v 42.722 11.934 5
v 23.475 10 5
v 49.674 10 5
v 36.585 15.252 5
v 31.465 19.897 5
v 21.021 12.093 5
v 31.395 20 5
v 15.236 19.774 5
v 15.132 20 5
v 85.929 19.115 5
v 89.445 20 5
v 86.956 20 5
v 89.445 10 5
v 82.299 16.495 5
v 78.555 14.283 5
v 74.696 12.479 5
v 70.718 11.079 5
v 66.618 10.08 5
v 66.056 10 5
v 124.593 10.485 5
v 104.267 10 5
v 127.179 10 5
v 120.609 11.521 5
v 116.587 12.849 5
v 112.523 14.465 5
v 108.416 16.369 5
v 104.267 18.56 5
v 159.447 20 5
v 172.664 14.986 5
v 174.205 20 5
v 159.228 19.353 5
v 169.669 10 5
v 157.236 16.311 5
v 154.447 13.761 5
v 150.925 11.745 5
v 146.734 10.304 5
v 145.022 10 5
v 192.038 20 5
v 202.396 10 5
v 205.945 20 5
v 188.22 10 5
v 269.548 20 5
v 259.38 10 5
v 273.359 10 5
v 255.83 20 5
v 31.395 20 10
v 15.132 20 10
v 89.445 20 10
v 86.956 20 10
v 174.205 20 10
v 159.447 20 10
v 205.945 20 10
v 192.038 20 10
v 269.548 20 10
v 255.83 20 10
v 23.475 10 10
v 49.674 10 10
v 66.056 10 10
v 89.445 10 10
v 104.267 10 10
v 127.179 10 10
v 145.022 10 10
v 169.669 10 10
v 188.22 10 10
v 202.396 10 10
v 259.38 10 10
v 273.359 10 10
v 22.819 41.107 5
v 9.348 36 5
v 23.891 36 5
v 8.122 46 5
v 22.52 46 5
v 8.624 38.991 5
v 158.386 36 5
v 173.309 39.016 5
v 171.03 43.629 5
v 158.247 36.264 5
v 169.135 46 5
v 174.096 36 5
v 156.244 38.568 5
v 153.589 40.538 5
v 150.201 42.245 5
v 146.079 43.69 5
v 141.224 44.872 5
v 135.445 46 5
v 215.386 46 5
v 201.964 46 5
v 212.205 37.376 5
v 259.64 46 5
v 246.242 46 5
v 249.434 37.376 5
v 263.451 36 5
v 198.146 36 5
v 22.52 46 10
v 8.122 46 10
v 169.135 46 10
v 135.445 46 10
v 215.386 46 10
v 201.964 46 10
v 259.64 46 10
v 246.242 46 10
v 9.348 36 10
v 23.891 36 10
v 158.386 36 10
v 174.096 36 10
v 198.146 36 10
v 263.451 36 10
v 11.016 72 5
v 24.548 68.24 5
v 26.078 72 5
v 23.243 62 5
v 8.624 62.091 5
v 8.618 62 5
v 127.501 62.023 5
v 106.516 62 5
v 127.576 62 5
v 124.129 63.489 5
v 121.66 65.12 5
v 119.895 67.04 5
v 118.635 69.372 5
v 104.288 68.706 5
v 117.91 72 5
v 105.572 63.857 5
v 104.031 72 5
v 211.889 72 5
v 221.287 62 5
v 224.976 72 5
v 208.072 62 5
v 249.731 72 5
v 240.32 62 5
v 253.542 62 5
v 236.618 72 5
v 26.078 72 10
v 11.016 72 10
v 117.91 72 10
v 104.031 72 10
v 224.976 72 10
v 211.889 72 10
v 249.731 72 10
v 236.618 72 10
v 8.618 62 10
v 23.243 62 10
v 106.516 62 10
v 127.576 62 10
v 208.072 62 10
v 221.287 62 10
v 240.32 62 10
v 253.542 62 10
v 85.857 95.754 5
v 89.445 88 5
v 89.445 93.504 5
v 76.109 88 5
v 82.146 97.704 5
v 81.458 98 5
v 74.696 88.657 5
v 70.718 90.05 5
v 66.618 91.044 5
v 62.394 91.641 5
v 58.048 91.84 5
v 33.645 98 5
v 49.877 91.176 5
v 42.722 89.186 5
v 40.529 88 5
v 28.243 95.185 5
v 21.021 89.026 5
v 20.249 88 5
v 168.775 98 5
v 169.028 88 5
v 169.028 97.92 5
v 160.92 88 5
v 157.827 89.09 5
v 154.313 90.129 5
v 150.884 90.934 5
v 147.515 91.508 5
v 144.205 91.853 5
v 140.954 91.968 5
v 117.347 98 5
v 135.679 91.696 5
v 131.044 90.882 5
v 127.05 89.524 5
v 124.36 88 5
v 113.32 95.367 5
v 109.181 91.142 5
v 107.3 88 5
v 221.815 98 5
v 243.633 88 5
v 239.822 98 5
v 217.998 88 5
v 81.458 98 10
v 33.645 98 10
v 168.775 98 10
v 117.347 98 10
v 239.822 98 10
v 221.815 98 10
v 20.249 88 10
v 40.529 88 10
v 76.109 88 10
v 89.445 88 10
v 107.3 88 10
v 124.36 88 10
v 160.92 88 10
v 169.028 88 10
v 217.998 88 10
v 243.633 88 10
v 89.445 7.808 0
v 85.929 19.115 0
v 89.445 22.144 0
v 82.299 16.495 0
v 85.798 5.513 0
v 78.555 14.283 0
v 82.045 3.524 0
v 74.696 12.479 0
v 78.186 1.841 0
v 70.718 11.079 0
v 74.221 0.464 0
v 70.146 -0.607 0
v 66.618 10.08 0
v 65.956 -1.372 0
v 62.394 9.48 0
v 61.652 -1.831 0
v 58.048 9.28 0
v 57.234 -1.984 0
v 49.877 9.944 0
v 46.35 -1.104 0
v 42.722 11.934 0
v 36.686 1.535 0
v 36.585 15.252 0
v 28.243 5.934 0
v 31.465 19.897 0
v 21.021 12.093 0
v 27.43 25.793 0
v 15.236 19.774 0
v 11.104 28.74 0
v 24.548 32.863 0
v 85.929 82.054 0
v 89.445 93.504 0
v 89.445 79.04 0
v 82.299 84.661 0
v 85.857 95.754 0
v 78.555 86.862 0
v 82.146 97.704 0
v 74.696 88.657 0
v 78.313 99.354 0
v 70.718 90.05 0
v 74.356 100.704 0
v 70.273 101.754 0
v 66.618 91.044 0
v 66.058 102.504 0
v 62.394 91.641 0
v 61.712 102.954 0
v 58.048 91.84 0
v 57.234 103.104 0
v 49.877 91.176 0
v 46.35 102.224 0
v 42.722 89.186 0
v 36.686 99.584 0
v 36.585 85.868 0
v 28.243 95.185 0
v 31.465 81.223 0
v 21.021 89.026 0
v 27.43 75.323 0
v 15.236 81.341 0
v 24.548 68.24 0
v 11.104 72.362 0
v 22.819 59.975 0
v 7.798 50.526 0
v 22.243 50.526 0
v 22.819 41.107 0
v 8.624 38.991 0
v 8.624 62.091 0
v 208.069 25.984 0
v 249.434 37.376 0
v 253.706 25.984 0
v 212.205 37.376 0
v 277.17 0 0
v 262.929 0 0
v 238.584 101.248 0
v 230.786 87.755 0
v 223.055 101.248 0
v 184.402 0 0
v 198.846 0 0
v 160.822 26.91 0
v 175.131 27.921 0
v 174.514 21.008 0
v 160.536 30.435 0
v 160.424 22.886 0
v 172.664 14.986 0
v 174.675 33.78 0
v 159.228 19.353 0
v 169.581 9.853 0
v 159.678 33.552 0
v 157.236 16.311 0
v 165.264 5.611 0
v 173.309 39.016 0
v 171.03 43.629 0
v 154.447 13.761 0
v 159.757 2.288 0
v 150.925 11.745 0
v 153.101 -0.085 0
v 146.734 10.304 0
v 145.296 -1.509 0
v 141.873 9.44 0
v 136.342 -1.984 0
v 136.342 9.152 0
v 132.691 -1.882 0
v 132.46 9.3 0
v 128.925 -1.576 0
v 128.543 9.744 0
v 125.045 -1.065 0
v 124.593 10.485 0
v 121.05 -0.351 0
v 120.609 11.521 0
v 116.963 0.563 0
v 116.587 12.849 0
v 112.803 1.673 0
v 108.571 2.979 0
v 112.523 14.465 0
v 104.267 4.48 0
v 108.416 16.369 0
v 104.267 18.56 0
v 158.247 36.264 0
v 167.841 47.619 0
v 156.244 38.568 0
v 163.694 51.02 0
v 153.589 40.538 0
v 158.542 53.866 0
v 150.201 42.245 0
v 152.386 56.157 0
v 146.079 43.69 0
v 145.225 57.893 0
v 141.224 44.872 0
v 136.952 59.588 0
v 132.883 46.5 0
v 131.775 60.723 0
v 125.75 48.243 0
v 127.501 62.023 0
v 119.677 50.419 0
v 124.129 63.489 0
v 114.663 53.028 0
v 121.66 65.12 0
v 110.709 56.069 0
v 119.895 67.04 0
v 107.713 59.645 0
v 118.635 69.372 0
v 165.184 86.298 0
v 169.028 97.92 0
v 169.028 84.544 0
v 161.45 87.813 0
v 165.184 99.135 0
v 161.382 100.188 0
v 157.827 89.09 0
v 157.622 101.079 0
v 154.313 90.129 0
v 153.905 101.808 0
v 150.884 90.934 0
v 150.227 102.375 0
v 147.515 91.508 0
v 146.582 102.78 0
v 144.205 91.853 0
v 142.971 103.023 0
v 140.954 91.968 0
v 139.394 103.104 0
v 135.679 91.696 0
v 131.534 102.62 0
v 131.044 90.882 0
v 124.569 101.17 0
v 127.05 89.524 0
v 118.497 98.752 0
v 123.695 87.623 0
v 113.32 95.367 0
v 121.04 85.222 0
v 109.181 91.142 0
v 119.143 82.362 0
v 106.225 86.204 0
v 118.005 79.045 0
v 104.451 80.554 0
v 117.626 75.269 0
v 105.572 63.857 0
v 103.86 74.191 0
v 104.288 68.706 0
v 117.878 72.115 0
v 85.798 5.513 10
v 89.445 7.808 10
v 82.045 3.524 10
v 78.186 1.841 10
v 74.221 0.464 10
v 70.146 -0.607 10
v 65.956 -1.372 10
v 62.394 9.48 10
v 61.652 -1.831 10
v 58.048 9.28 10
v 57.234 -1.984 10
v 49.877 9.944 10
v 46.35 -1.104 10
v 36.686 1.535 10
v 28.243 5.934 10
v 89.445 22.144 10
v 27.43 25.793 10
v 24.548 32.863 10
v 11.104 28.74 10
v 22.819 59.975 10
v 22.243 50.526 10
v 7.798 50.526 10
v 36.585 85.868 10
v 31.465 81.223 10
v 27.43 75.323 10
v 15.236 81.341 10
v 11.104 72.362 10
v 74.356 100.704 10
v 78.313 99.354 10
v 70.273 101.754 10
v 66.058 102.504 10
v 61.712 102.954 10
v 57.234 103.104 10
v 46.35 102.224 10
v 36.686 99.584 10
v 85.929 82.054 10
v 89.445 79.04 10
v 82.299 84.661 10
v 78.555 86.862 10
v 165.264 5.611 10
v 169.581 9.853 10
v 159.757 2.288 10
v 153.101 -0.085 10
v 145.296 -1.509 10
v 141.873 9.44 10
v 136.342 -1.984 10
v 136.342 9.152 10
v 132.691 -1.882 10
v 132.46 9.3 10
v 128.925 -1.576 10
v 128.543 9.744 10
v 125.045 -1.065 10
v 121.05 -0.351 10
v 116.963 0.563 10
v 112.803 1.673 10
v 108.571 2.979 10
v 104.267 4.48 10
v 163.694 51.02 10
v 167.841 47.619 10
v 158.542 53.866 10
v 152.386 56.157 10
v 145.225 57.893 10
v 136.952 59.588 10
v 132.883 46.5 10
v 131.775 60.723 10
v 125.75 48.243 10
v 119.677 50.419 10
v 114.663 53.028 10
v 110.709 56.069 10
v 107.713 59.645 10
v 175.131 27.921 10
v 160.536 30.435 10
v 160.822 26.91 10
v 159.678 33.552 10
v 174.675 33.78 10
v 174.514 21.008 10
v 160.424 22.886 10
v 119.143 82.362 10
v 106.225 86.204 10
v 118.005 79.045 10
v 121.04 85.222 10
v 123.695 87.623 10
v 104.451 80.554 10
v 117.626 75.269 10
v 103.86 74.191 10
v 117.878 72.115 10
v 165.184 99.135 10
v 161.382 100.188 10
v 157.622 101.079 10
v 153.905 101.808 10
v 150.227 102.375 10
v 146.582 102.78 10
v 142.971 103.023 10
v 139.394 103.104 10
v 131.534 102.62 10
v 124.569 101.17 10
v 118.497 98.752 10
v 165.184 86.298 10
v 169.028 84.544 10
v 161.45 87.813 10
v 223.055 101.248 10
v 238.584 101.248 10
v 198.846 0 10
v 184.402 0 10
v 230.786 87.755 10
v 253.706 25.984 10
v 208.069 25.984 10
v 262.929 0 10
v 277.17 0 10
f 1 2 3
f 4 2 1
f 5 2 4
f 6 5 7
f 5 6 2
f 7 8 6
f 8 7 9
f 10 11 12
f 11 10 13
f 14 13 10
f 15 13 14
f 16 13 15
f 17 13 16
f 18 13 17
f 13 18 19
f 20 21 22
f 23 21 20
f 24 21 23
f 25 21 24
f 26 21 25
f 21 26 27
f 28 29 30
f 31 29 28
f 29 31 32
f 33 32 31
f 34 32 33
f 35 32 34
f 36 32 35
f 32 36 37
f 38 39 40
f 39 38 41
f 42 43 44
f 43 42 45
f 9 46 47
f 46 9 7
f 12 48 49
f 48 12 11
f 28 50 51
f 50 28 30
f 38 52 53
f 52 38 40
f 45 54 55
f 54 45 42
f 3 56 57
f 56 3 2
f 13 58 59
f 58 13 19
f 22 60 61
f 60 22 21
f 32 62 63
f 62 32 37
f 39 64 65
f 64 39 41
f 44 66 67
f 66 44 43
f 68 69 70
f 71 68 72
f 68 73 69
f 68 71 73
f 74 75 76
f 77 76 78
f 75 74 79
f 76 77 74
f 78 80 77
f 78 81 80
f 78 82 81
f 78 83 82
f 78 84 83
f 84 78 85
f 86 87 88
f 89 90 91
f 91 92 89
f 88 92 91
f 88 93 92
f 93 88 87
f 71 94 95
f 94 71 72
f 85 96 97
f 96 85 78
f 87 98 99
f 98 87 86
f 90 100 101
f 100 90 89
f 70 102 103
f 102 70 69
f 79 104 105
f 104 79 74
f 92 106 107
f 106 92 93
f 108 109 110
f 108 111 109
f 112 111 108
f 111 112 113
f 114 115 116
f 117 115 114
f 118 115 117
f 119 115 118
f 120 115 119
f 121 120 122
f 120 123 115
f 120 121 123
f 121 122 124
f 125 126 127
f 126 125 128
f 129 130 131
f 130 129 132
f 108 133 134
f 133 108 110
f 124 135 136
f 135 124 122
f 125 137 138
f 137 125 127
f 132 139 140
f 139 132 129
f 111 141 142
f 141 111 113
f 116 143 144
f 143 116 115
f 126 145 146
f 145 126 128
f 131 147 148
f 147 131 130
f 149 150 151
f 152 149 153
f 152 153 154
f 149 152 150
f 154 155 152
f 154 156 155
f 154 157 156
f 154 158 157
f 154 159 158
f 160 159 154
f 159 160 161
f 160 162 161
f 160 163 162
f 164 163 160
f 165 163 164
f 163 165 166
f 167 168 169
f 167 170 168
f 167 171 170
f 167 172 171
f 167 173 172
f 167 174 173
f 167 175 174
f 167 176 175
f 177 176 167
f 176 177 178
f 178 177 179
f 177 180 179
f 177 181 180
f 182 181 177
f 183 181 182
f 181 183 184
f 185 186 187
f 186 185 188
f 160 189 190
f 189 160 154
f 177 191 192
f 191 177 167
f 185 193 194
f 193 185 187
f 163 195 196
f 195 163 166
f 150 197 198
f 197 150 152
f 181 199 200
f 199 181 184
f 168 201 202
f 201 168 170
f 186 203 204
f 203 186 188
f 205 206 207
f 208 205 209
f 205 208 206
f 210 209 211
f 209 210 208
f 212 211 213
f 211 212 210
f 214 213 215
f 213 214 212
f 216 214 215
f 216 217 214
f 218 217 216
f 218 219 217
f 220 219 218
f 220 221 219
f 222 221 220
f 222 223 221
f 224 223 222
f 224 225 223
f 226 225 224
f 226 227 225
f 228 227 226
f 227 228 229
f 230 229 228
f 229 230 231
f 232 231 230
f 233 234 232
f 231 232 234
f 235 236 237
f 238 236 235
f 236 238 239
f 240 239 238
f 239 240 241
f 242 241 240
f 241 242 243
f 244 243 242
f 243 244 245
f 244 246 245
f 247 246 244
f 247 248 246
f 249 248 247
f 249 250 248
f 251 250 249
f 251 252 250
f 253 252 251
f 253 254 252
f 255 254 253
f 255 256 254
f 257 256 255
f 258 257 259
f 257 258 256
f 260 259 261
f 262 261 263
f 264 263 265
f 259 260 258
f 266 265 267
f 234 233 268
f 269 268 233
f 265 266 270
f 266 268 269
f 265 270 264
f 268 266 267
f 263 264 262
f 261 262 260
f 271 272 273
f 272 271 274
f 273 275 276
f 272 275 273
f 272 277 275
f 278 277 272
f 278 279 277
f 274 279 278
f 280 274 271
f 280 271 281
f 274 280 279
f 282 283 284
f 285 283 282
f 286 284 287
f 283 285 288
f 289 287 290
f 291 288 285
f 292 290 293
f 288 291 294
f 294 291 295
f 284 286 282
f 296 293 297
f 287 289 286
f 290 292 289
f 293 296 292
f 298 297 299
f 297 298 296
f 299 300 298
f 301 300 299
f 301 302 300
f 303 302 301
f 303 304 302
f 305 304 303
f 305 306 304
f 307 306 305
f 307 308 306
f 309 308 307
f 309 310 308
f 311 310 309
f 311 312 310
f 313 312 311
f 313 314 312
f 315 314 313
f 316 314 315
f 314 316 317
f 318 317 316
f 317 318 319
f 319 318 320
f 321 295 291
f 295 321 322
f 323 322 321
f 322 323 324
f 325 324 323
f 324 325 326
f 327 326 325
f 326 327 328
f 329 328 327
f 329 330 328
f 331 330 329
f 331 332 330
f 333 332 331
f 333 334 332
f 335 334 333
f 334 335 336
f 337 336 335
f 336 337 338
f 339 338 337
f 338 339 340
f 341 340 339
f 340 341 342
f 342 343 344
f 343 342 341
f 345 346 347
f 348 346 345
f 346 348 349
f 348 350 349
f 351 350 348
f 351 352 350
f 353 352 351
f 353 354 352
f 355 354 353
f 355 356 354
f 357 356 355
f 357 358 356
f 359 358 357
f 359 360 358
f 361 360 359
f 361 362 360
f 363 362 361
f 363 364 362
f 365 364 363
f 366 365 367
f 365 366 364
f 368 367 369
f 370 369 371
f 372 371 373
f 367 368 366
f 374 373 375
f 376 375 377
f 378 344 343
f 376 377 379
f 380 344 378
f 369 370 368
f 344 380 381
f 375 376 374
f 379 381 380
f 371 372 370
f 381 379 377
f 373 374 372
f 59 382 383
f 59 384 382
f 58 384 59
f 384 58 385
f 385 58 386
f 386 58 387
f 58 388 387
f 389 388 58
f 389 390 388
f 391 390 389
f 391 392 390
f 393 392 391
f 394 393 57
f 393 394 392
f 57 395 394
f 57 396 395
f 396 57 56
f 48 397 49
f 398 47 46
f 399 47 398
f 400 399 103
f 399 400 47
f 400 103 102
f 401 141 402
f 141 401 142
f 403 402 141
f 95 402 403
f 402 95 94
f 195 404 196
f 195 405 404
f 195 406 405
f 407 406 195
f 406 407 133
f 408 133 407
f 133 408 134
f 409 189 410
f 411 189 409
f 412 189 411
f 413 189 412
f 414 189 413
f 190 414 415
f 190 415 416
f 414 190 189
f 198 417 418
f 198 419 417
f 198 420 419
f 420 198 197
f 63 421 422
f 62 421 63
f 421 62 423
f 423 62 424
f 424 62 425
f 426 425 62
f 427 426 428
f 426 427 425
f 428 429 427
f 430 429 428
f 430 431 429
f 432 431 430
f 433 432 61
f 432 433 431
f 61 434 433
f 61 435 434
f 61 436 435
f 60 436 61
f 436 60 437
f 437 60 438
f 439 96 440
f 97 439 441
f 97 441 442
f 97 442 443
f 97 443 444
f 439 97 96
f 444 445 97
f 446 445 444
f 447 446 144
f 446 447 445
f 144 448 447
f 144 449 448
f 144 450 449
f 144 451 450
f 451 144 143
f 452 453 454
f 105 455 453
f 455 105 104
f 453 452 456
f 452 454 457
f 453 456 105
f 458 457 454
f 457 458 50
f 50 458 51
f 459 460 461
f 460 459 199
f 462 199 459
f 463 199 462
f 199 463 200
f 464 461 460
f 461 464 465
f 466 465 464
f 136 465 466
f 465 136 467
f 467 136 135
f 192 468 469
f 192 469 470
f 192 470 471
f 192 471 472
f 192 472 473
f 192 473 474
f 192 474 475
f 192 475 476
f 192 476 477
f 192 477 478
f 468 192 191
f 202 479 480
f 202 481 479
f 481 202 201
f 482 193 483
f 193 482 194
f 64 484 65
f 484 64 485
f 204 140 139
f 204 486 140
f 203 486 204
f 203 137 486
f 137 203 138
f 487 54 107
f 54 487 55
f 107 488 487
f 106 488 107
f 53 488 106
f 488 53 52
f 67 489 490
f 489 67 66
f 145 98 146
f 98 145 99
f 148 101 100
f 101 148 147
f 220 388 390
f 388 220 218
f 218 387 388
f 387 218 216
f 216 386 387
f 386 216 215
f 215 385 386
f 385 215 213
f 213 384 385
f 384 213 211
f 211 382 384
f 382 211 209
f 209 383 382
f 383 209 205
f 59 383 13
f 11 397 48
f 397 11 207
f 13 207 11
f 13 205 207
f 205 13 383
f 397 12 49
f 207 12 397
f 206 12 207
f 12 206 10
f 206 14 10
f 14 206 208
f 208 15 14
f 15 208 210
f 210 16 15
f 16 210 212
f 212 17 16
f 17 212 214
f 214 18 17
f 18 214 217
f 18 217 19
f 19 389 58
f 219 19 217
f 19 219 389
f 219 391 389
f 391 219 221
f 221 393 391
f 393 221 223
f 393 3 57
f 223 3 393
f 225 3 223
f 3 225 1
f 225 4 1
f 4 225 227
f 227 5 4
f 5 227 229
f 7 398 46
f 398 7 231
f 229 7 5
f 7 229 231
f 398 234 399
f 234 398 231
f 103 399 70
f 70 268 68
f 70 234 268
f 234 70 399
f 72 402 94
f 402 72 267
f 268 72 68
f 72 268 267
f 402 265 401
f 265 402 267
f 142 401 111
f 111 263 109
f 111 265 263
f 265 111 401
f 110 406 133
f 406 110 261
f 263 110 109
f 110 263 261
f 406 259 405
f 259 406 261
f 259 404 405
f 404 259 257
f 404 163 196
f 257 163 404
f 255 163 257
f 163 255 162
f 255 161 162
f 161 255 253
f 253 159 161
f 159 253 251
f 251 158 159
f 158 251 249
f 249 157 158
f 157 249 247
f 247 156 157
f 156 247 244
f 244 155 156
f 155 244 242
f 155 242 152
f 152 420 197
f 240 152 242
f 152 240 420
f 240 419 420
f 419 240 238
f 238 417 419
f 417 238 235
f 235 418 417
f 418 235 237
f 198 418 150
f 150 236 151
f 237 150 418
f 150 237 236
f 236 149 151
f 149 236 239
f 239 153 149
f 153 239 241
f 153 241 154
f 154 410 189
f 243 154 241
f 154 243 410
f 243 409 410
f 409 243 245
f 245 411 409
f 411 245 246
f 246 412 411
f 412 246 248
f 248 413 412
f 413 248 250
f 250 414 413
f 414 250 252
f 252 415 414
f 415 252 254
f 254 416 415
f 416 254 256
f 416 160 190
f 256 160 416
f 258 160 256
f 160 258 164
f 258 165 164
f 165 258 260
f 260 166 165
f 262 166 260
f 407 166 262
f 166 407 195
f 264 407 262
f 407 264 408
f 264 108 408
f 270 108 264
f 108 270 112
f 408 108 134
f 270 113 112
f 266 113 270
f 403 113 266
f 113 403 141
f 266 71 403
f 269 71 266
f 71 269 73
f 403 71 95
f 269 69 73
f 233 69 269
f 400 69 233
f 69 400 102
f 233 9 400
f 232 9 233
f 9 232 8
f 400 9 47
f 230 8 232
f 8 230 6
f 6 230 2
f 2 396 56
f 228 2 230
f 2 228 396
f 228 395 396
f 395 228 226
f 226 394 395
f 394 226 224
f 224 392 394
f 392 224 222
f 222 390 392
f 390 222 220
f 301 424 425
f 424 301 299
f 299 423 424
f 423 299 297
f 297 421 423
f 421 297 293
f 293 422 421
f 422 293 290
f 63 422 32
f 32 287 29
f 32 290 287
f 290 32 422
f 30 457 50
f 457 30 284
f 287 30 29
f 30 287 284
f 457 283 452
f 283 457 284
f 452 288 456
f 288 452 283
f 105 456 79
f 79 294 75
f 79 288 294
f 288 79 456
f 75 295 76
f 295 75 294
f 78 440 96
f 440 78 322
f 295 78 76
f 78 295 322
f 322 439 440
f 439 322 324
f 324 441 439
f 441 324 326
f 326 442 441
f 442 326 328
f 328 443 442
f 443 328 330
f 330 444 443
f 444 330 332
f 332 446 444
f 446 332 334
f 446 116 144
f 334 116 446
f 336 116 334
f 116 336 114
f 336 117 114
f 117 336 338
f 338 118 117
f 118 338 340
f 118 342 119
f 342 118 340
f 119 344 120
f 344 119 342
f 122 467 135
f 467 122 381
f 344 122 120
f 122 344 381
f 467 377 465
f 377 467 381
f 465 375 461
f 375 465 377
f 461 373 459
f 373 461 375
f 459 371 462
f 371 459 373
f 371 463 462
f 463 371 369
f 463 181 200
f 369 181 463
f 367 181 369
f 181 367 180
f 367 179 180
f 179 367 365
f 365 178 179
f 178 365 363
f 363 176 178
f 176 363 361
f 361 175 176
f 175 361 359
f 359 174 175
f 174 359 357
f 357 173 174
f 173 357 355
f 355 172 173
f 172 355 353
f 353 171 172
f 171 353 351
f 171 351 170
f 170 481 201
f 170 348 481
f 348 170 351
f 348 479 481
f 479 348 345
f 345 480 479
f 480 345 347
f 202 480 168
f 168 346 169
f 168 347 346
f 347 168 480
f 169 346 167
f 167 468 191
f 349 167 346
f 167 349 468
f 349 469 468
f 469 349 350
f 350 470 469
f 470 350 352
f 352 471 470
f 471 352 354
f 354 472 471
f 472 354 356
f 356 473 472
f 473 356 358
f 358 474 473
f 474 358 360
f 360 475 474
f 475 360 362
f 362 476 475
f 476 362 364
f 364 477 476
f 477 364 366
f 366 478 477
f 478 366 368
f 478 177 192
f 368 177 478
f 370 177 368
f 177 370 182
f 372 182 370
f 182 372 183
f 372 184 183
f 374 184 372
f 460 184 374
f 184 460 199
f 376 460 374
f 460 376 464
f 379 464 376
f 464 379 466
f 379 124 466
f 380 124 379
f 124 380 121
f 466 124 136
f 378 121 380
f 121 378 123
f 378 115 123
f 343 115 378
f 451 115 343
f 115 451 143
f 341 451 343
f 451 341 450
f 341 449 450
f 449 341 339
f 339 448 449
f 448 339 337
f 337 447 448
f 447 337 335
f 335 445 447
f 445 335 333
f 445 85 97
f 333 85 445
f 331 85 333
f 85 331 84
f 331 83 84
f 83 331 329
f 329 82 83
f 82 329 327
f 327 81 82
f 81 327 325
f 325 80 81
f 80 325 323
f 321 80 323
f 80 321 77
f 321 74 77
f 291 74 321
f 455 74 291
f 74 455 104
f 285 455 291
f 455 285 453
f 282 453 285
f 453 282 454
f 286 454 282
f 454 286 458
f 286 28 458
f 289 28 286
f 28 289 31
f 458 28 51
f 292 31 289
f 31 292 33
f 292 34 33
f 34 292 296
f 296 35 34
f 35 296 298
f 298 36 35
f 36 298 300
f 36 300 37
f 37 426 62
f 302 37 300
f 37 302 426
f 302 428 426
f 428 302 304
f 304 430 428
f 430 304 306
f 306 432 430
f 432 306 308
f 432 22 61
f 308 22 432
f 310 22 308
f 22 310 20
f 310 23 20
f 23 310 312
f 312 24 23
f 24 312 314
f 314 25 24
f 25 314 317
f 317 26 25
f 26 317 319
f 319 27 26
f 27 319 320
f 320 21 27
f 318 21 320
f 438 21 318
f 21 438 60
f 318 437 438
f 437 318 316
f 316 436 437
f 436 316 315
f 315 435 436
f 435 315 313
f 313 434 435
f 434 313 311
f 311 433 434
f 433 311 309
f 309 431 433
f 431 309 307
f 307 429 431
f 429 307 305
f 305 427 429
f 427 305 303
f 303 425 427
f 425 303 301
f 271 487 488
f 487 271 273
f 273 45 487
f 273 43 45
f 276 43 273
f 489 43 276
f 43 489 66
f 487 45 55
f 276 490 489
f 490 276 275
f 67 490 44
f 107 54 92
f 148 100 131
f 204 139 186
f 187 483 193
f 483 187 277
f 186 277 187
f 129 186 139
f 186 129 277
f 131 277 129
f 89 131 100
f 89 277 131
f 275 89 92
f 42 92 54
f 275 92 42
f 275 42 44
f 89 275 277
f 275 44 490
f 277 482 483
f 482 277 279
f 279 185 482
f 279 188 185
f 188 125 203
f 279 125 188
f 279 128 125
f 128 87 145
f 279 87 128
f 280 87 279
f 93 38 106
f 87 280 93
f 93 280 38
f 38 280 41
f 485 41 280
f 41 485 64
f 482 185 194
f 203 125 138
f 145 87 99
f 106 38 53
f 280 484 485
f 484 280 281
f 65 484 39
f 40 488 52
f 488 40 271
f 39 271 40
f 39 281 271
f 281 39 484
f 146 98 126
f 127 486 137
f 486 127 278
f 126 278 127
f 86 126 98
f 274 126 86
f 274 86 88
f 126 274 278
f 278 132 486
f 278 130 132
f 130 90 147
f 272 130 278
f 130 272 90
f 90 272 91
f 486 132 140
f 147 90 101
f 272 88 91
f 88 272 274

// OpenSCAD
char_size = 100;
char_h = 10;

line_width = 10;
line_pitch = 16;
line_offset = 5;

base_h = 5;

difference() {
    linear_extrude(char_h)
    text("CSA", font="Ricty", size=char_size);
    translate([0, 0, base_h])
    union() {
        translate([0, line_offset, 0])
            for (i = [-20:20]) {
                translate([0, i * (line_pitch + line_width) + line_offset, 0])
                    cube([char_size * 10, line_width, char_h + base_h]);
            }
    }
}
